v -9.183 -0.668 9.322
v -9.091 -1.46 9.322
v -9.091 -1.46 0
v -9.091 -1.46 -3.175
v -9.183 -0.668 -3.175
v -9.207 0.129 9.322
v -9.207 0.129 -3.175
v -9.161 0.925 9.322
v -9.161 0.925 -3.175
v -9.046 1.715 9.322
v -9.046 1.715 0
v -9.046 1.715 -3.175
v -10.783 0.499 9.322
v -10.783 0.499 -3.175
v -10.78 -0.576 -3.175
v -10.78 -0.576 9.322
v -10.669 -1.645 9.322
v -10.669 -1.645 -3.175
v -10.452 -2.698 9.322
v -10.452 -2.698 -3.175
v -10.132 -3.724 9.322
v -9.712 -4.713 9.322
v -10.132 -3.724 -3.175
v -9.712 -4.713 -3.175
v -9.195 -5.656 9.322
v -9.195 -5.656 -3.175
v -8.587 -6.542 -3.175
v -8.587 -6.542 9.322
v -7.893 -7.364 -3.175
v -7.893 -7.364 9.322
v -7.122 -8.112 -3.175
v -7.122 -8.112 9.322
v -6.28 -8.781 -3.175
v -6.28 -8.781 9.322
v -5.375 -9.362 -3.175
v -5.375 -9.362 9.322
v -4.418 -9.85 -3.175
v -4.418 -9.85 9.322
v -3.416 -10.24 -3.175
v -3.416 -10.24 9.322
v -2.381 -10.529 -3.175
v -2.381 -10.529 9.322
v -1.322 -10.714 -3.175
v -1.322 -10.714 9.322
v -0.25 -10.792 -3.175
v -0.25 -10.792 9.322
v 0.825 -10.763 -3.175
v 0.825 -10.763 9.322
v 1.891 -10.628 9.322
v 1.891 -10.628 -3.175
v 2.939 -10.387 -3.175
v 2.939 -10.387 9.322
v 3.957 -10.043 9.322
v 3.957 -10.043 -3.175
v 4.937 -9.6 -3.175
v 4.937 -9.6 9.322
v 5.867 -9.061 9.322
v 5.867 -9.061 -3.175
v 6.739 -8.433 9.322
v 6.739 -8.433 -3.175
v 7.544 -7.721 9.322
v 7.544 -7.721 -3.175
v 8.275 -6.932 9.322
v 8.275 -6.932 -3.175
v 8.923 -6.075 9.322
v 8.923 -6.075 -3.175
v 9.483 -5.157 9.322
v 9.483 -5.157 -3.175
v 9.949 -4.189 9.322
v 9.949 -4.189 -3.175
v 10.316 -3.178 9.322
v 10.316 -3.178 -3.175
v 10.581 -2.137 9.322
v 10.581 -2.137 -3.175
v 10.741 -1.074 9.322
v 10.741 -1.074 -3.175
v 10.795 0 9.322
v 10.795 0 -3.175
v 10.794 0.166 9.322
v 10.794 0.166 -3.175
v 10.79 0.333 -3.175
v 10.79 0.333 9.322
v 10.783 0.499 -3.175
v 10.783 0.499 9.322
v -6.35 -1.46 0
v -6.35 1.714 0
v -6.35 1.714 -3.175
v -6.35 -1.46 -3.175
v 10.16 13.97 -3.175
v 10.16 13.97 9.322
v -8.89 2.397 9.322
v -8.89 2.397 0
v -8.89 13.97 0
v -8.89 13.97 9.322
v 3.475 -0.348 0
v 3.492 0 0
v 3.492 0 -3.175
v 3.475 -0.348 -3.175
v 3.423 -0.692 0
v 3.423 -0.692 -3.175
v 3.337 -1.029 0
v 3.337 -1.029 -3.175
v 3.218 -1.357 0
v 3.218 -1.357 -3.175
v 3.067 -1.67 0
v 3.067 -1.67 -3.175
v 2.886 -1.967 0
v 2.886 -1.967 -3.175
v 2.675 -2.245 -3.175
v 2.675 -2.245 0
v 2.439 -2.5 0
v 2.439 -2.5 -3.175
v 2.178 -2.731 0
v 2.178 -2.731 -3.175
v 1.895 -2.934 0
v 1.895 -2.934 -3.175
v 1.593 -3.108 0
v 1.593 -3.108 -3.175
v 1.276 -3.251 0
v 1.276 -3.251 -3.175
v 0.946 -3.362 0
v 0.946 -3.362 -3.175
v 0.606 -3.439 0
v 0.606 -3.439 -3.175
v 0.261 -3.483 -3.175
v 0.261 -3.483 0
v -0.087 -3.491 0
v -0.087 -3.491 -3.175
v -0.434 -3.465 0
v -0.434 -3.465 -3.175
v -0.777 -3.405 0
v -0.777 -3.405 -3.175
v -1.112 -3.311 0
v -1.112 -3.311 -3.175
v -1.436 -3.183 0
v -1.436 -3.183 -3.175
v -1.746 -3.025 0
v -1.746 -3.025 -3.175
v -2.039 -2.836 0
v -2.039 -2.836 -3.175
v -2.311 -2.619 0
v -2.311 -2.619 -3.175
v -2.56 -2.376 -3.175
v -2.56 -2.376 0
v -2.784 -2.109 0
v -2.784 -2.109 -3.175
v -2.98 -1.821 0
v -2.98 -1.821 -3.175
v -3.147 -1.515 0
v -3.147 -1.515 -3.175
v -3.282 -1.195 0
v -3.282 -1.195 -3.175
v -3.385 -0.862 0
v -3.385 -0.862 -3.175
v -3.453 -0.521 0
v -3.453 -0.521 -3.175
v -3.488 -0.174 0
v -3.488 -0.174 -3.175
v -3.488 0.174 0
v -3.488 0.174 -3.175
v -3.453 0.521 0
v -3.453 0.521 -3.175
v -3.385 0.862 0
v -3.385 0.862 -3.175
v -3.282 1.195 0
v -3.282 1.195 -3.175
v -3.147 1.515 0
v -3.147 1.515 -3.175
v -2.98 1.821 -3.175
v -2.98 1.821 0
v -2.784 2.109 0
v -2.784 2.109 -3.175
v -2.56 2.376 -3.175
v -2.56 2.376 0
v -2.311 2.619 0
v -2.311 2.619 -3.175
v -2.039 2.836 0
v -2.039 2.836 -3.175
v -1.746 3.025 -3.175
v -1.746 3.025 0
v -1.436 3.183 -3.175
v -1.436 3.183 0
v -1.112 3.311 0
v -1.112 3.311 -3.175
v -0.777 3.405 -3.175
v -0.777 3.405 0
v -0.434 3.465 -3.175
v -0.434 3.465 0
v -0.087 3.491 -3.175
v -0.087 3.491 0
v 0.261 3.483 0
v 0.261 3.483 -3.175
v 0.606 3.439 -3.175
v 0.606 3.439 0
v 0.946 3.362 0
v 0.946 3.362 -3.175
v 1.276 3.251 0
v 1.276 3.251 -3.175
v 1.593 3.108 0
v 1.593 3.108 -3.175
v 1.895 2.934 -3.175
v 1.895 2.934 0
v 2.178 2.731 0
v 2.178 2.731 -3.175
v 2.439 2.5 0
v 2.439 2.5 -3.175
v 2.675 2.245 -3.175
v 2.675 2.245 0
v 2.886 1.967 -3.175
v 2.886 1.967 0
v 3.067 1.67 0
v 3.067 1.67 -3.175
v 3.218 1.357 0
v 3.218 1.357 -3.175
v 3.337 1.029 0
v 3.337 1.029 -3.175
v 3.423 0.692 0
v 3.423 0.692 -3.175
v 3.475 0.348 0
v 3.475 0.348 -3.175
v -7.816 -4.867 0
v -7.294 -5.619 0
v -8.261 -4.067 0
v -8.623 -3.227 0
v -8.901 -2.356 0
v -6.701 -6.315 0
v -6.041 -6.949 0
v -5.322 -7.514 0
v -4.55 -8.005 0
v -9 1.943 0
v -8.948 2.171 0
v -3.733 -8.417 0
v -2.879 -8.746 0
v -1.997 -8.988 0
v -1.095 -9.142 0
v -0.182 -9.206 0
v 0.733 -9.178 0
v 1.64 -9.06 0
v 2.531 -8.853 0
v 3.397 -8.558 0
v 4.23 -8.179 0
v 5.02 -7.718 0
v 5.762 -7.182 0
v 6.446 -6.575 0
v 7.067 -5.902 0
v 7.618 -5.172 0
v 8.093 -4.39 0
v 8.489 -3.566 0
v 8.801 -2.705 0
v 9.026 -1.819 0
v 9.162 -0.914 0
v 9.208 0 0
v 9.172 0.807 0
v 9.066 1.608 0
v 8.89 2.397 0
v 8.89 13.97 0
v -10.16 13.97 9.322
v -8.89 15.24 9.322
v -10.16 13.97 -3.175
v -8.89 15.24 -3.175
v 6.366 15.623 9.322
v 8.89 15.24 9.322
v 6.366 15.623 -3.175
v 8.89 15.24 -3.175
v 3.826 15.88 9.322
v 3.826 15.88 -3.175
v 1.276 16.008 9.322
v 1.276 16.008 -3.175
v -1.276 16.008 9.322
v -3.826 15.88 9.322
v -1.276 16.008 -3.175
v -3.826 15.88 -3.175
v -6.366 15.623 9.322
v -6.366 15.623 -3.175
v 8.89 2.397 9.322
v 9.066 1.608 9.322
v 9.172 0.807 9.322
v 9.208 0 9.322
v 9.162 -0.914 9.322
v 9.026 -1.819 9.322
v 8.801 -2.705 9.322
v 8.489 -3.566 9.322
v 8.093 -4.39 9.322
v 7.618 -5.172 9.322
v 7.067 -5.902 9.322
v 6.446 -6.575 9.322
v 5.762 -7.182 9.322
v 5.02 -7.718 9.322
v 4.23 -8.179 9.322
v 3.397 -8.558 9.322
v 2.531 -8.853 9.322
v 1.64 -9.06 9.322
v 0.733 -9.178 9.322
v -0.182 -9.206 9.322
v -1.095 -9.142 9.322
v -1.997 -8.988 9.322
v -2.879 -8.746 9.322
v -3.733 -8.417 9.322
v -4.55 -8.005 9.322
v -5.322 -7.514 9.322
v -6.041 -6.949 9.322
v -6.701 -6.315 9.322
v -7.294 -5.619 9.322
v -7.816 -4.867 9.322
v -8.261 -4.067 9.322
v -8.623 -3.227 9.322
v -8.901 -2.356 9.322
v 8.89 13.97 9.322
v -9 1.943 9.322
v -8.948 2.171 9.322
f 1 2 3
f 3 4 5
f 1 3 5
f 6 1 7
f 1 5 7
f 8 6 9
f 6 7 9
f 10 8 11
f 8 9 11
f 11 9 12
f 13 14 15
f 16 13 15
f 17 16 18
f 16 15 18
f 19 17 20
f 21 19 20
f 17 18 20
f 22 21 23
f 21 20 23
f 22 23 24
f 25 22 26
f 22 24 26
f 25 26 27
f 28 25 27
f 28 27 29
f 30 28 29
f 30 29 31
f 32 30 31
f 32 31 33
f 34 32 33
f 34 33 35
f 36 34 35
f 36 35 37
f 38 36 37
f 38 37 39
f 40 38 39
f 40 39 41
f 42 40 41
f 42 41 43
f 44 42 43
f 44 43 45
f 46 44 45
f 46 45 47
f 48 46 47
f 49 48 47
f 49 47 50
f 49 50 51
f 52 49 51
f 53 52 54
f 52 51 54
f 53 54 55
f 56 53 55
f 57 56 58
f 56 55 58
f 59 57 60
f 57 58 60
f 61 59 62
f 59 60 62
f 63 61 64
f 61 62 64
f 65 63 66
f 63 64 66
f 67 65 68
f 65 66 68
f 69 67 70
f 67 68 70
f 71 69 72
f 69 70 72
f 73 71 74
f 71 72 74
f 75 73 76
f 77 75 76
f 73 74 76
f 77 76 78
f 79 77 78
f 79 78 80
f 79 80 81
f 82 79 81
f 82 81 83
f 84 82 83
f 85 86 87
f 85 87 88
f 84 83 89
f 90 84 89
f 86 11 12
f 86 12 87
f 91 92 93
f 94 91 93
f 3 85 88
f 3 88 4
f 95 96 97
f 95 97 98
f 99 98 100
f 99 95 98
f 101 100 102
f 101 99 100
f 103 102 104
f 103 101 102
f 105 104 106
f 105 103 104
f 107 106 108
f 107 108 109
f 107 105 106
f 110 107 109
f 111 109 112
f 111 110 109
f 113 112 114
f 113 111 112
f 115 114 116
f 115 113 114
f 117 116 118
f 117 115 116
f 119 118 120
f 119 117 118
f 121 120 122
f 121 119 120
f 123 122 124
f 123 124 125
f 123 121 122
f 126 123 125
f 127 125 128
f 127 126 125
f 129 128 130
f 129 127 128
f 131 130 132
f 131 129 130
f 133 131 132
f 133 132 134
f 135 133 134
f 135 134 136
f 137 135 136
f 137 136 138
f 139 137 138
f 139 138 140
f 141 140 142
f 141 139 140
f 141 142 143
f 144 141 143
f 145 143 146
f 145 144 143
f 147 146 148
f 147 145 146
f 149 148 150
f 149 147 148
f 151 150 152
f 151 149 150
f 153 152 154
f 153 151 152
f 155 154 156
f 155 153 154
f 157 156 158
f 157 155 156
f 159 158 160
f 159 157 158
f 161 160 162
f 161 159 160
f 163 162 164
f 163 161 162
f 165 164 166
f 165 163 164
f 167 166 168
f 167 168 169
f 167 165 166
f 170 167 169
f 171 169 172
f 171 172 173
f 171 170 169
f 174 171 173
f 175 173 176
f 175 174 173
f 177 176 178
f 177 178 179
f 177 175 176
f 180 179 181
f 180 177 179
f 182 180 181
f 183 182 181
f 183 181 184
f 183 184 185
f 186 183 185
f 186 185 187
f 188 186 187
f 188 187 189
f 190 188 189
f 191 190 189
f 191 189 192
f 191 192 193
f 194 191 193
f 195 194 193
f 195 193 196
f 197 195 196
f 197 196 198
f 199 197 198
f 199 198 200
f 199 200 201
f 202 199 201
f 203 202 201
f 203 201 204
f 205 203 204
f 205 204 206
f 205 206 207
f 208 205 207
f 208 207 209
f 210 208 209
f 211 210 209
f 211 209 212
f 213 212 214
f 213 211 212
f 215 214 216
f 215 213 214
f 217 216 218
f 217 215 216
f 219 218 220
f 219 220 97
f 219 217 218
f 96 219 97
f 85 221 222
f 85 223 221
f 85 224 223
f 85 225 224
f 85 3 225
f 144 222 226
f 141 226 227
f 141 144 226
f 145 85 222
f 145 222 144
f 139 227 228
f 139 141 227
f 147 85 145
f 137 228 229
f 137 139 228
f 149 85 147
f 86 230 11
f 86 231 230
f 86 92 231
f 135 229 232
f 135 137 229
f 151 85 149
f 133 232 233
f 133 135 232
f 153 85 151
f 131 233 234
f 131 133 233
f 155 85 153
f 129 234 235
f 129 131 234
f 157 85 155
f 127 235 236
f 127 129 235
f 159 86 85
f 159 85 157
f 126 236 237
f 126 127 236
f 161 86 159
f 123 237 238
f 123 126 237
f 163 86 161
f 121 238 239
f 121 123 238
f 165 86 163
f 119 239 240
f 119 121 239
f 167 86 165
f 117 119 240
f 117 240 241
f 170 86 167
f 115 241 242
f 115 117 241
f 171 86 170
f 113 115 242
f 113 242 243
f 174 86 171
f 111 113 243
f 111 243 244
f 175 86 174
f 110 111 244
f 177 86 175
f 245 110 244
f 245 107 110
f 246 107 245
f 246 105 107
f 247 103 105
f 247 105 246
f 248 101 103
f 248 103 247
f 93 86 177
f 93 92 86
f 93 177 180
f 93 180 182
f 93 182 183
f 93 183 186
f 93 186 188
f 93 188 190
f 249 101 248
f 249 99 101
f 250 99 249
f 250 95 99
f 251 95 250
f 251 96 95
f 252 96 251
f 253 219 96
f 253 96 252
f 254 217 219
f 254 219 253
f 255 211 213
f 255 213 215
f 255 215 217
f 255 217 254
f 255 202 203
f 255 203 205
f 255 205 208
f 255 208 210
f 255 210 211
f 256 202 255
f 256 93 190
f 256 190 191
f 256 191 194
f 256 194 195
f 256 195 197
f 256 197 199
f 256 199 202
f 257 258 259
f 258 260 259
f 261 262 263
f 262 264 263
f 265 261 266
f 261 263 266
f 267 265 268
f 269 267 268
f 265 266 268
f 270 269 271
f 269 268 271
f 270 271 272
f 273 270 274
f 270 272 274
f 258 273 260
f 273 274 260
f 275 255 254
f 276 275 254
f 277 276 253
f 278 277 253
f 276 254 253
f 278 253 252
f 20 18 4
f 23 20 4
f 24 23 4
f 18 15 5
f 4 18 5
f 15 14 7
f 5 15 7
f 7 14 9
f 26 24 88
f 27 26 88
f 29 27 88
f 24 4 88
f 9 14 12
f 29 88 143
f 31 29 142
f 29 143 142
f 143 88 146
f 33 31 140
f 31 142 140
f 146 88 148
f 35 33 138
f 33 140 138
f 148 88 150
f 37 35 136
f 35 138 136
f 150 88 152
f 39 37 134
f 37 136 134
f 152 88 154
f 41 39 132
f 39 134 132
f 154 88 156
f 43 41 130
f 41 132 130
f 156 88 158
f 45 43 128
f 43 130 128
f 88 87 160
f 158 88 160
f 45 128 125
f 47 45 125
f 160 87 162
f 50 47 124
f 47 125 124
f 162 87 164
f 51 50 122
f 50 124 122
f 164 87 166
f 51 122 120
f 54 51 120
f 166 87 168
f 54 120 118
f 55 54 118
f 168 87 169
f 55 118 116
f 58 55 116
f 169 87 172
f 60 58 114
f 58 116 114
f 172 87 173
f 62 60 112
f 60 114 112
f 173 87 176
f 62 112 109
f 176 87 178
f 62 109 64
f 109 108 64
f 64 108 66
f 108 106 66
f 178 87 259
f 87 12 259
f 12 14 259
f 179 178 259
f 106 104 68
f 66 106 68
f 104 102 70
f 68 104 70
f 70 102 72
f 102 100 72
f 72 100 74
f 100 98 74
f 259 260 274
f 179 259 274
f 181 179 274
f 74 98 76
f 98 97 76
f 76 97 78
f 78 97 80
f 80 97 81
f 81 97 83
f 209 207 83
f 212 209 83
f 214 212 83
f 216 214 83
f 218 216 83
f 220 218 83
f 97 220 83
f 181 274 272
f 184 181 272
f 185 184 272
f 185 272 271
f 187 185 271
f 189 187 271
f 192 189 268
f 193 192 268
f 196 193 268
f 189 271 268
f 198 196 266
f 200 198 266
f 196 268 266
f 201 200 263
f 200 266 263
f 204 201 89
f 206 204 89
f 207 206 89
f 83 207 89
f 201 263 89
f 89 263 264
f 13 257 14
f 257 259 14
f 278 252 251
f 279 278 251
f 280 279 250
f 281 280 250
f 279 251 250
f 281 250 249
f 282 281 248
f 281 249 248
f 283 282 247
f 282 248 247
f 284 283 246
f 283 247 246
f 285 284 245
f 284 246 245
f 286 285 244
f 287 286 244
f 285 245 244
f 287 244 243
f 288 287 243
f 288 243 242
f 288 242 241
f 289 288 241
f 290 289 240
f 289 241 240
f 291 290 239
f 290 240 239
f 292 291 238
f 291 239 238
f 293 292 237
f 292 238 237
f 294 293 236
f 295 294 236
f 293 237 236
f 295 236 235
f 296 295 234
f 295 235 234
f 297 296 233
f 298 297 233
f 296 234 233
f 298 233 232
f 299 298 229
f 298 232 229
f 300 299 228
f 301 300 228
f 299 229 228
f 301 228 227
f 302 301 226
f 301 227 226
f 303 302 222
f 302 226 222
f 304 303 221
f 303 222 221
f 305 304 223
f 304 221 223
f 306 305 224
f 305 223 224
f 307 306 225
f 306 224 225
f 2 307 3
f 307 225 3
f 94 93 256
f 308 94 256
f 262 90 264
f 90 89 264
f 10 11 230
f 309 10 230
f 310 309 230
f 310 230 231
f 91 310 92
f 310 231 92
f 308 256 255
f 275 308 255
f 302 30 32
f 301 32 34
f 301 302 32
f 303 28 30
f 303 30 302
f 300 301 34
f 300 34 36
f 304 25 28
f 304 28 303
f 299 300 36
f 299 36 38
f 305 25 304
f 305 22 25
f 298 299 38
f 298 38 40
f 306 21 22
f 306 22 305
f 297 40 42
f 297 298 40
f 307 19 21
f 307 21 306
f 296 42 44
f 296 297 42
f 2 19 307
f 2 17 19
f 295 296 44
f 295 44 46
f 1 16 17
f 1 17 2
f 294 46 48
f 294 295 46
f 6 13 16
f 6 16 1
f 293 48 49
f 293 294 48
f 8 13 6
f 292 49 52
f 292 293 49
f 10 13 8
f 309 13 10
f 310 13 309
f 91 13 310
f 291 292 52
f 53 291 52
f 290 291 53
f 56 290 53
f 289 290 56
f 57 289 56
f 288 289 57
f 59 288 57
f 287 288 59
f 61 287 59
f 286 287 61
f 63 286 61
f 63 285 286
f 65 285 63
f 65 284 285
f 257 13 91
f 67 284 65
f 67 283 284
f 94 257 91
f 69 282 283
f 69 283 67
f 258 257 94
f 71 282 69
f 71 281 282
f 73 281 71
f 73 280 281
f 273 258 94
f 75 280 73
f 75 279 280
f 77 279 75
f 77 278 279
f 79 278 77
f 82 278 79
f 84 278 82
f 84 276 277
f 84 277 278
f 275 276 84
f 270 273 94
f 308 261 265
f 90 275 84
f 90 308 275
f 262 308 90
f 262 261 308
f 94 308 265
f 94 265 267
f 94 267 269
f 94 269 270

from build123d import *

# Parameters (mm, degrees)
F1_DEPTH = 3.175
F2_DEPTH = 9.3218


with BuildPart() as f1:
    # F0 (on Top) → F1 (new body)
    with BuildSketch(Plane.XY):
        with BuildLine():
            ThreePointArc((-9.0909293254, -1.4605), (-9.2065972542, 0.1289311761), (-9.0464659398, 1.7145))
            ThreePointArc((-9.0464659398, 1.7145), (-8.9747244461, 2.0572742564), (-8.89, 2.3970724332))
            Line((-8.89, 2.3970724332), (-8.89, 6.1237182332))
            ThreePointArc((-8.89, 6.1237182332), (-10.2308541629, 3.4440743454), (-10.7834571202, 0.4990766843))
            ThreePointArc((-10.7834571202, 0.4990766843), (-0.2496050755, -10.7921138942), (10.795, 0))
            ThreePointArc((10.795, 0), (10.792113895, 0.2496050431), (10.7834571232, 0.4990766196))
            ThreePointArc((10.7834571232, 0.4990766196), (10.2308541733, 3.4440743147), (8.89, 6.1237182332))
            Line((8.89, 6.1237182332), (8.89, 2.3970724332))
            ThreePointArc((8.89, 2.3970724332), (9.1277798848, 1.2090039806), (9.2075, 0))
            ThreePointArc((9.2075, 0), (0.7325723466, -9.1783110651), (-9.0909293254, -1.4605))
        make_face()
        with BuildLine():
            ThreePointArc((-10.7834571202, 0.4990766843), (-10.2308541629, 3.4440743454), (-8.89, 6.1237182332))
            Line((-8.89, 6.1237182332), (-8.89, 13.97))
            Line((-8.89, 13.97), (-10.16, 13.97))
            Line((-10.16, 13.97), (-10.7834571202, 0.4990766843))
        make_face()
        with BuildLine():
            Line((8.89, 13.97), (8.89, 6.1237182332))
            ThreePointArc((8.89, 6.1237182332), (10.2308541733, 3.4440743147), (10.7834571232, 0.4990766196))
            Line((10.7834571232, 0.4990766196), (10.16, 13.97))
            Line((10.16, 13.97), (8.89, 13.97))
        make_face()
        with BuildLine():
            Line((-8.89, 15.24), (-8.89, 13.97))
            Line((-8.89, 13.97), (0, 13.97))
            Line((0, 13.97), (8.89, 13.97))
            Line((8.89, 13.97), (8.89, 15.24))
            ThreePointArc((8.89, 15.24), (0, 16.0239235845), (-8.89, 15.24))
        make_face()
        Polygon((-10.16, 13.97), (-8.89, 13.97), (-8.89, 15.24), align=None)
        Polygon((8.89, 15.24), (8.89, 13.97), (10.16, 13.97), align=None)
        with BuildLine():
            Line((-8.89, 13.97), (-8.89, 6.1237182332))
            ThreePointArc((-8.89, 6.1237182332), (0, 10.795), (8.89, 6.1237182332))
            Line((8.89, 6.1237182332), (8.89, 13.97))
            Line((8.89, 13.97), (0, 13.97))
            Line((0, 13.97), (-8.89, 13.97))
        make_face()
        with BuildLine():
            Line((-8.89, 6.1237182332), (-8.89, 2.3970724332))
            ThreePointArc((-8.89, 2.3970724332), (0, 9.2075), (8.89, 2.3970724332))
            Line((8.89, 2.3970724332), (8.89, 6.1237182332))
            ThreePointArc((8.89, 6.1237182332), (0, 10.795), (-8.89, 6.1237182332))
        make_face()
        with BuildLine():
            ThreePointArc((8.89, 2.3970724332), (0, 9.2075), (-8.89, 2.3970724332))
            Line((-8.89, 2.3970724332), (-8.89, 1.7145))
            Line((-8.89, 1.7145), (-6.35, 1.7145))
            Line((-6.35, 1.7145), (-6.35, 0))
            Line((-6.35, 0), (-3.4925, 0))
            ThreePointArc((-3.4925, 0), (0, 3.4925), (3.4925, 0))
            Line((3.4925, 0), (8.89, 0))
            Line((8.89, 0), (8.89, 2.3970724332))
        make_face()
        with BuildLine():
            Line((-6.35, -1.4605), (-9.0909293254, -1.4605))
            ThreePointArc((-9.0909293254, -1.4605), (0.7325723466, -9.1783110651), (9.2075, 0))
            ThreePointArc((9.2075, 0), (9.1277798848, 1.2090039806), (8.89, 2.3970724332))
            Line((8.89, 2.3970724332), (8.89, 0))
            Line((8.89, 0), (3.4925, 0))
            ThreePointArc((3.4925, 0), (0, -3.4925), (-3.4925, 0))
            Line((-3.4925, 0), (-6.35, 0))
            Line((-6.35, 0), (-6.35, -1.4605))
        make_face()
        with BuildLine():
            ThreePointArc((-8.89, 2.3970724332), (-8.9747244461, 2.0572742564), (-9.0464659398, 1.7145))
            Line((-9.0464659398, 1.7145), (-8.89, 1.7145))
            Line((-8.89, 1.7145), (-8.89, 2.3970724332))
        make_face()
    extrude(amount=-F1_DEPTH)

    # F0 (on Top) → F2 (join)
    with BuildSketch(Plane.XY):
        with BuildLine():
            ThreePointArc((-10.7834571202, 0.4990766843), (-10.2308541629, 3.4440743454), (-8.89, 6.1237182332))
            Line((-8.89, 6.1237182332), (-8.89, 13.97))
            Line((-8.89, 13.97), (-10.16, 13.97))
            Line((-10.16, 13.97), (-10.7834571202, 0.4990766843))
        make_face()
        with BuildLine():
            ThreePointArc((-9.0909293254, -1.4605), (-9.2065972542, 0.1289311761), (-9.0464659398, 1.7145))
            ThreePointArc((-9.0464659398, 1.7145), (-8.9747244461, 2.0572742564), (-8.89, 2.3970724332))
            Line((-8.89, 2.3970724332), (-8.89, 6.1237182332))
            ThreePointArc((-8.89, 6.1237182332), (-10.2308541629, 3.4440743454), (-10.7834571202, 0.4990766843))
            ThreePointArc((-10.7834571202, 0.4990766843), (-0.2496050755, -10.7921138942), (10.795, 0))
            ThreePointArc((10.795, 0), (10.792113895, 0.2496050431), (10.7834571232, 0.4990766196))
            ThreePointArc((10.7834571232, 0.4990766196), (10.2308541733, 3.4440743147), (8.89, 6.1237182332))
            Line((8.89, 6.1237182332), (8.89, 2.3970724332))
            ThreePointArc((8.89, 2.3970724332), (9.1277798848, 1.2090039806), (9.2075, 0))
            ThreePointArc((9.2075, 0), (0.7325723466, -9.1783110651), (-9.0909293254, -1.4605))
        make_face()
        with BuildLine():
            Line((8.89, 13.97), (8.89, 6.1237182332))
            ThreePointArc((8.89, 6.1237182332), (10.2308541733, 3.4440743147), (10.7834571232, 0.4990766196))
            Line((10.7834571232, 0.4990766196), (10.16, 13.97))
            Line((10.16, 13.97), (8.89, 13.97))
        make_face()
        with BuildLine():
            Line((-8.89, 15.24), (-8.89, 13.97))
            Line((-8.89, 13.97), (0, 13.97))
            Line((0, 13.97), (8.89, 13.97))
            Line((8.89, 13.97), (8.89, 15.24))
            ThreePointArc((8.89, 15.24), (0, 16.0239235845), (-8.89, 15.24))
        make_face()
        Polygon((-10.16, 13.97), (-8.89, 13.97), (-8.89, 15.24), align=None)
        Polygon((8.89, 15.24), (8.89, 13.97), (10.16, 13.97), align=None)
    extrude(amount=F2_DEPTH)


solid = f1.part
